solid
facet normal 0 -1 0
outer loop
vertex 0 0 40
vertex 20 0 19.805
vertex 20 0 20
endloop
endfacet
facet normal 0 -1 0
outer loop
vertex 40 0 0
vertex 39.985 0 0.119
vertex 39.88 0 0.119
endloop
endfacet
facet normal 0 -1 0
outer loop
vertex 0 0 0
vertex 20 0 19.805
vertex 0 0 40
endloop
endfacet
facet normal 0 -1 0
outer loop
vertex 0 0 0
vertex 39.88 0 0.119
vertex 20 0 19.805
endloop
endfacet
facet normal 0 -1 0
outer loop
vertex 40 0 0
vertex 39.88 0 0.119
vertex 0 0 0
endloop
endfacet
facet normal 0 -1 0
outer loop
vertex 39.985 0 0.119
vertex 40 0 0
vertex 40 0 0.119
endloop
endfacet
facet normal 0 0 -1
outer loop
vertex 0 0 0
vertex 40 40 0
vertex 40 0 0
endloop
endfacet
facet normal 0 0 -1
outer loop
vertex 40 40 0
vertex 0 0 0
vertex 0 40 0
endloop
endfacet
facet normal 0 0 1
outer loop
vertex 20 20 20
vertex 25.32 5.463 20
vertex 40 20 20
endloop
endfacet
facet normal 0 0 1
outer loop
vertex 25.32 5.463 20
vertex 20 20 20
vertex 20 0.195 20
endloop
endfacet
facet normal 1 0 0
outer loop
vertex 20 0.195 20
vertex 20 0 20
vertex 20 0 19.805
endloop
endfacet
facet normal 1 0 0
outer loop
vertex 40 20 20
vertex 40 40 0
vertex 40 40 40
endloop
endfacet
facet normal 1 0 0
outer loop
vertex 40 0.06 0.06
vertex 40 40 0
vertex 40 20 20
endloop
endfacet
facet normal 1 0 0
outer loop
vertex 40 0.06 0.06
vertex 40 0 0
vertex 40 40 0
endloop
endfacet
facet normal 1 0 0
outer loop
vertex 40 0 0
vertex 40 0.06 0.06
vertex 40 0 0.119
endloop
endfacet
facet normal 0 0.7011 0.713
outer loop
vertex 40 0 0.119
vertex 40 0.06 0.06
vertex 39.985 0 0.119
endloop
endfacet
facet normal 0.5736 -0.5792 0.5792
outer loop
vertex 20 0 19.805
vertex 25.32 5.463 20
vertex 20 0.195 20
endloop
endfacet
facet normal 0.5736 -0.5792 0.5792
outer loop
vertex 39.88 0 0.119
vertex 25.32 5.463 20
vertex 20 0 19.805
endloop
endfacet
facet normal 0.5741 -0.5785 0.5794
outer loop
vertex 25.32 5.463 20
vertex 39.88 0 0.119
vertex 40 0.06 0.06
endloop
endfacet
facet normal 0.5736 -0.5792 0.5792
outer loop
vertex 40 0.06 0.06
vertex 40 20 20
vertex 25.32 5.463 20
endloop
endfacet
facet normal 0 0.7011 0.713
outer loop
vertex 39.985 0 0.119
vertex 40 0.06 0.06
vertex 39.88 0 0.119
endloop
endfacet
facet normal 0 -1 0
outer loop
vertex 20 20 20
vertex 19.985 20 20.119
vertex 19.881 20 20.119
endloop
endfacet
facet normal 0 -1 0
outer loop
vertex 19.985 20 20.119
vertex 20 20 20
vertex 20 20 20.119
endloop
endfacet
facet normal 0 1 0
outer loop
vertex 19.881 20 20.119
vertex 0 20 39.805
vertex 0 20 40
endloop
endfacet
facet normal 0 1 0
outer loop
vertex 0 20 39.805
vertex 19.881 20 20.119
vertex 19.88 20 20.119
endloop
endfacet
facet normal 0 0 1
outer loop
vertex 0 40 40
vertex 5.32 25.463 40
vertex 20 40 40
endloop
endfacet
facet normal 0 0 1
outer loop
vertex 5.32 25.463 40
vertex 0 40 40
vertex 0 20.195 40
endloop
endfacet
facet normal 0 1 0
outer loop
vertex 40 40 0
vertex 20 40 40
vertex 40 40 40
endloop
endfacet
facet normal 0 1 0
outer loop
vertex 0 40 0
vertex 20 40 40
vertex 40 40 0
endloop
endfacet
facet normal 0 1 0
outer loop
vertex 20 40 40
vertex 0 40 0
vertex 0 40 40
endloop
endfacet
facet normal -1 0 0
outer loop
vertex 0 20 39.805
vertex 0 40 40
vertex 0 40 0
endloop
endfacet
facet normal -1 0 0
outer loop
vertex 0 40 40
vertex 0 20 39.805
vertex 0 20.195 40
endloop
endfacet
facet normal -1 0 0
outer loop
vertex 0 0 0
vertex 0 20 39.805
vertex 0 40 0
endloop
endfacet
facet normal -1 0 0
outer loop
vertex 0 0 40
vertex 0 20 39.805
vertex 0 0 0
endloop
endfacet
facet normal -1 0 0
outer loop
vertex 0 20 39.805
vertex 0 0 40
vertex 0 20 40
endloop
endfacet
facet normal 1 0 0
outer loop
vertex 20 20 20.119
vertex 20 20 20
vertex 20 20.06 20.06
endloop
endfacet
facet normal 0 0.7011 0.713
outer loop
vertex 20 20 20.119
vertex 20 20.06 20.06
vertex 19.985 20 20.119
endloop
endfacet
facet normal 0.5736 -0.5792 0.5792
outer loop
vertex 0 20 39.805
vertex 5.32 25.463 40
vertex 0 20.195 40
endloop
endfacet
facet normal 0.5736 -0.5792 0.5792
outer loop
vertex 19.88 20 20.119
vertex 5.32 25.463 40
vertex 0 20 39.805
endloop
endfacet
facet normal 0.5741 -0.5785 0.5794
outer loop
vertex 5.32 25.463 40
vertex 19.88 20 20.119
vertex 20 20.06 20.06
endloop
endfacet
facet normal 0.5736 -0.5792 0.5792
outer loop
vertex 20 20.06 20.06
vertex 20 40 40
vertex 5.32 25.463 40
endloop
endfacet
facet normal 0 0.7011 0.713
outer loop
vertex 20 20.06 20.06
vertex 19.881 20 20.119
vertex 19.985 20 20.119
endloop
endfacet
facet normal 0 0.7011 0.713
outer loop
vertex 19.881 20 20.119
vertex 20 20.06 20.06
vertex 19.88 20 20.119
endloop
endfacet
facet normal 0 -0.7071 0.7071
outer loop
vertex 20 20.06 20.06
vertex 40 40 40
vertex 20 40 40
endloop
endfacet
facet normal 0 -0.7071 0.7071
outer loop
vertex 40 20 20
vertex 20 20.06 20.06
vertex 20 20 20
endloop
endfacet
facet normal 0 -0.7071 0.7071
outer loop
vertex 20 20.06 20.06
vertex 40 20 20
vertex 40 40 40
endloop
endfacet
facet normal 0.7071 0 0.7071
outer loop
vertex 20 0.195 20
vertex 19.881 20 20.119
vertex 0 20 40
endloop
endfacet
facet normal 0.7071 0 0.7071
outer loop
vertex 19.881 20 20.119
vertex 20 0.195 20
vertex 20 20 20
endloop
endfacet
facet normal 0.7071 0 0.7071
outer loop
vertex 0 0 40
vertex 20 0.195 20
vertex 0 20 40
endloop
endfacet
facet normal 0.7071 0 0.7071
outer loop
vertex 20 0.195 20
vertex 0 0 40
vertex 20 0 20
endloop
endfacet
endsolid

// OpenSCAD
// Plano inferior
translate([0, 20, 0])
cube([40,20,20]);
cube([20,20,20]);
// cubo con plano doble inclinado
translate([40, 20, 20])
  rotate([180, 0, 270])
    difference() {
      cube([20, 20, 20], center=false);

      mirror([0,0,1]){
        rotate([35, 45, 0]){
          color([1,0.8,0]) {
            cube([28.2, 28.2, 28.2], center=false);
          }
        }
      }
    }
 // Plano superior

 // cubo plano inclinado   
    translate([20, 40, 40])
  rotate([180, 0, 270])
    difference() {
      cube([20, 20, 20], center=false);

      mirror([0,0,1]){
        rotate([35, 45, 0]){
          color([1,0.8,0]) {
            cube([28.2, 28.2, 28.2], center=false);
          }
        }
      }
    }
    
         difference(){
 translate([20, 20, 20])
cube([20,20,20]);
              translate([20, 20, 20])
    rotate([45,0,0])
cube([20,30,20]);
        
    }  
    translate([40, -20, 0]) 
    rotate([0,0,90])
    difference(){
 translate([20, 20, 20])
cube([20,20,20]);
              translate([20, 20, 20])
    rotate([45,0,0])
cube([20,30,20]);
        
    }  
     
